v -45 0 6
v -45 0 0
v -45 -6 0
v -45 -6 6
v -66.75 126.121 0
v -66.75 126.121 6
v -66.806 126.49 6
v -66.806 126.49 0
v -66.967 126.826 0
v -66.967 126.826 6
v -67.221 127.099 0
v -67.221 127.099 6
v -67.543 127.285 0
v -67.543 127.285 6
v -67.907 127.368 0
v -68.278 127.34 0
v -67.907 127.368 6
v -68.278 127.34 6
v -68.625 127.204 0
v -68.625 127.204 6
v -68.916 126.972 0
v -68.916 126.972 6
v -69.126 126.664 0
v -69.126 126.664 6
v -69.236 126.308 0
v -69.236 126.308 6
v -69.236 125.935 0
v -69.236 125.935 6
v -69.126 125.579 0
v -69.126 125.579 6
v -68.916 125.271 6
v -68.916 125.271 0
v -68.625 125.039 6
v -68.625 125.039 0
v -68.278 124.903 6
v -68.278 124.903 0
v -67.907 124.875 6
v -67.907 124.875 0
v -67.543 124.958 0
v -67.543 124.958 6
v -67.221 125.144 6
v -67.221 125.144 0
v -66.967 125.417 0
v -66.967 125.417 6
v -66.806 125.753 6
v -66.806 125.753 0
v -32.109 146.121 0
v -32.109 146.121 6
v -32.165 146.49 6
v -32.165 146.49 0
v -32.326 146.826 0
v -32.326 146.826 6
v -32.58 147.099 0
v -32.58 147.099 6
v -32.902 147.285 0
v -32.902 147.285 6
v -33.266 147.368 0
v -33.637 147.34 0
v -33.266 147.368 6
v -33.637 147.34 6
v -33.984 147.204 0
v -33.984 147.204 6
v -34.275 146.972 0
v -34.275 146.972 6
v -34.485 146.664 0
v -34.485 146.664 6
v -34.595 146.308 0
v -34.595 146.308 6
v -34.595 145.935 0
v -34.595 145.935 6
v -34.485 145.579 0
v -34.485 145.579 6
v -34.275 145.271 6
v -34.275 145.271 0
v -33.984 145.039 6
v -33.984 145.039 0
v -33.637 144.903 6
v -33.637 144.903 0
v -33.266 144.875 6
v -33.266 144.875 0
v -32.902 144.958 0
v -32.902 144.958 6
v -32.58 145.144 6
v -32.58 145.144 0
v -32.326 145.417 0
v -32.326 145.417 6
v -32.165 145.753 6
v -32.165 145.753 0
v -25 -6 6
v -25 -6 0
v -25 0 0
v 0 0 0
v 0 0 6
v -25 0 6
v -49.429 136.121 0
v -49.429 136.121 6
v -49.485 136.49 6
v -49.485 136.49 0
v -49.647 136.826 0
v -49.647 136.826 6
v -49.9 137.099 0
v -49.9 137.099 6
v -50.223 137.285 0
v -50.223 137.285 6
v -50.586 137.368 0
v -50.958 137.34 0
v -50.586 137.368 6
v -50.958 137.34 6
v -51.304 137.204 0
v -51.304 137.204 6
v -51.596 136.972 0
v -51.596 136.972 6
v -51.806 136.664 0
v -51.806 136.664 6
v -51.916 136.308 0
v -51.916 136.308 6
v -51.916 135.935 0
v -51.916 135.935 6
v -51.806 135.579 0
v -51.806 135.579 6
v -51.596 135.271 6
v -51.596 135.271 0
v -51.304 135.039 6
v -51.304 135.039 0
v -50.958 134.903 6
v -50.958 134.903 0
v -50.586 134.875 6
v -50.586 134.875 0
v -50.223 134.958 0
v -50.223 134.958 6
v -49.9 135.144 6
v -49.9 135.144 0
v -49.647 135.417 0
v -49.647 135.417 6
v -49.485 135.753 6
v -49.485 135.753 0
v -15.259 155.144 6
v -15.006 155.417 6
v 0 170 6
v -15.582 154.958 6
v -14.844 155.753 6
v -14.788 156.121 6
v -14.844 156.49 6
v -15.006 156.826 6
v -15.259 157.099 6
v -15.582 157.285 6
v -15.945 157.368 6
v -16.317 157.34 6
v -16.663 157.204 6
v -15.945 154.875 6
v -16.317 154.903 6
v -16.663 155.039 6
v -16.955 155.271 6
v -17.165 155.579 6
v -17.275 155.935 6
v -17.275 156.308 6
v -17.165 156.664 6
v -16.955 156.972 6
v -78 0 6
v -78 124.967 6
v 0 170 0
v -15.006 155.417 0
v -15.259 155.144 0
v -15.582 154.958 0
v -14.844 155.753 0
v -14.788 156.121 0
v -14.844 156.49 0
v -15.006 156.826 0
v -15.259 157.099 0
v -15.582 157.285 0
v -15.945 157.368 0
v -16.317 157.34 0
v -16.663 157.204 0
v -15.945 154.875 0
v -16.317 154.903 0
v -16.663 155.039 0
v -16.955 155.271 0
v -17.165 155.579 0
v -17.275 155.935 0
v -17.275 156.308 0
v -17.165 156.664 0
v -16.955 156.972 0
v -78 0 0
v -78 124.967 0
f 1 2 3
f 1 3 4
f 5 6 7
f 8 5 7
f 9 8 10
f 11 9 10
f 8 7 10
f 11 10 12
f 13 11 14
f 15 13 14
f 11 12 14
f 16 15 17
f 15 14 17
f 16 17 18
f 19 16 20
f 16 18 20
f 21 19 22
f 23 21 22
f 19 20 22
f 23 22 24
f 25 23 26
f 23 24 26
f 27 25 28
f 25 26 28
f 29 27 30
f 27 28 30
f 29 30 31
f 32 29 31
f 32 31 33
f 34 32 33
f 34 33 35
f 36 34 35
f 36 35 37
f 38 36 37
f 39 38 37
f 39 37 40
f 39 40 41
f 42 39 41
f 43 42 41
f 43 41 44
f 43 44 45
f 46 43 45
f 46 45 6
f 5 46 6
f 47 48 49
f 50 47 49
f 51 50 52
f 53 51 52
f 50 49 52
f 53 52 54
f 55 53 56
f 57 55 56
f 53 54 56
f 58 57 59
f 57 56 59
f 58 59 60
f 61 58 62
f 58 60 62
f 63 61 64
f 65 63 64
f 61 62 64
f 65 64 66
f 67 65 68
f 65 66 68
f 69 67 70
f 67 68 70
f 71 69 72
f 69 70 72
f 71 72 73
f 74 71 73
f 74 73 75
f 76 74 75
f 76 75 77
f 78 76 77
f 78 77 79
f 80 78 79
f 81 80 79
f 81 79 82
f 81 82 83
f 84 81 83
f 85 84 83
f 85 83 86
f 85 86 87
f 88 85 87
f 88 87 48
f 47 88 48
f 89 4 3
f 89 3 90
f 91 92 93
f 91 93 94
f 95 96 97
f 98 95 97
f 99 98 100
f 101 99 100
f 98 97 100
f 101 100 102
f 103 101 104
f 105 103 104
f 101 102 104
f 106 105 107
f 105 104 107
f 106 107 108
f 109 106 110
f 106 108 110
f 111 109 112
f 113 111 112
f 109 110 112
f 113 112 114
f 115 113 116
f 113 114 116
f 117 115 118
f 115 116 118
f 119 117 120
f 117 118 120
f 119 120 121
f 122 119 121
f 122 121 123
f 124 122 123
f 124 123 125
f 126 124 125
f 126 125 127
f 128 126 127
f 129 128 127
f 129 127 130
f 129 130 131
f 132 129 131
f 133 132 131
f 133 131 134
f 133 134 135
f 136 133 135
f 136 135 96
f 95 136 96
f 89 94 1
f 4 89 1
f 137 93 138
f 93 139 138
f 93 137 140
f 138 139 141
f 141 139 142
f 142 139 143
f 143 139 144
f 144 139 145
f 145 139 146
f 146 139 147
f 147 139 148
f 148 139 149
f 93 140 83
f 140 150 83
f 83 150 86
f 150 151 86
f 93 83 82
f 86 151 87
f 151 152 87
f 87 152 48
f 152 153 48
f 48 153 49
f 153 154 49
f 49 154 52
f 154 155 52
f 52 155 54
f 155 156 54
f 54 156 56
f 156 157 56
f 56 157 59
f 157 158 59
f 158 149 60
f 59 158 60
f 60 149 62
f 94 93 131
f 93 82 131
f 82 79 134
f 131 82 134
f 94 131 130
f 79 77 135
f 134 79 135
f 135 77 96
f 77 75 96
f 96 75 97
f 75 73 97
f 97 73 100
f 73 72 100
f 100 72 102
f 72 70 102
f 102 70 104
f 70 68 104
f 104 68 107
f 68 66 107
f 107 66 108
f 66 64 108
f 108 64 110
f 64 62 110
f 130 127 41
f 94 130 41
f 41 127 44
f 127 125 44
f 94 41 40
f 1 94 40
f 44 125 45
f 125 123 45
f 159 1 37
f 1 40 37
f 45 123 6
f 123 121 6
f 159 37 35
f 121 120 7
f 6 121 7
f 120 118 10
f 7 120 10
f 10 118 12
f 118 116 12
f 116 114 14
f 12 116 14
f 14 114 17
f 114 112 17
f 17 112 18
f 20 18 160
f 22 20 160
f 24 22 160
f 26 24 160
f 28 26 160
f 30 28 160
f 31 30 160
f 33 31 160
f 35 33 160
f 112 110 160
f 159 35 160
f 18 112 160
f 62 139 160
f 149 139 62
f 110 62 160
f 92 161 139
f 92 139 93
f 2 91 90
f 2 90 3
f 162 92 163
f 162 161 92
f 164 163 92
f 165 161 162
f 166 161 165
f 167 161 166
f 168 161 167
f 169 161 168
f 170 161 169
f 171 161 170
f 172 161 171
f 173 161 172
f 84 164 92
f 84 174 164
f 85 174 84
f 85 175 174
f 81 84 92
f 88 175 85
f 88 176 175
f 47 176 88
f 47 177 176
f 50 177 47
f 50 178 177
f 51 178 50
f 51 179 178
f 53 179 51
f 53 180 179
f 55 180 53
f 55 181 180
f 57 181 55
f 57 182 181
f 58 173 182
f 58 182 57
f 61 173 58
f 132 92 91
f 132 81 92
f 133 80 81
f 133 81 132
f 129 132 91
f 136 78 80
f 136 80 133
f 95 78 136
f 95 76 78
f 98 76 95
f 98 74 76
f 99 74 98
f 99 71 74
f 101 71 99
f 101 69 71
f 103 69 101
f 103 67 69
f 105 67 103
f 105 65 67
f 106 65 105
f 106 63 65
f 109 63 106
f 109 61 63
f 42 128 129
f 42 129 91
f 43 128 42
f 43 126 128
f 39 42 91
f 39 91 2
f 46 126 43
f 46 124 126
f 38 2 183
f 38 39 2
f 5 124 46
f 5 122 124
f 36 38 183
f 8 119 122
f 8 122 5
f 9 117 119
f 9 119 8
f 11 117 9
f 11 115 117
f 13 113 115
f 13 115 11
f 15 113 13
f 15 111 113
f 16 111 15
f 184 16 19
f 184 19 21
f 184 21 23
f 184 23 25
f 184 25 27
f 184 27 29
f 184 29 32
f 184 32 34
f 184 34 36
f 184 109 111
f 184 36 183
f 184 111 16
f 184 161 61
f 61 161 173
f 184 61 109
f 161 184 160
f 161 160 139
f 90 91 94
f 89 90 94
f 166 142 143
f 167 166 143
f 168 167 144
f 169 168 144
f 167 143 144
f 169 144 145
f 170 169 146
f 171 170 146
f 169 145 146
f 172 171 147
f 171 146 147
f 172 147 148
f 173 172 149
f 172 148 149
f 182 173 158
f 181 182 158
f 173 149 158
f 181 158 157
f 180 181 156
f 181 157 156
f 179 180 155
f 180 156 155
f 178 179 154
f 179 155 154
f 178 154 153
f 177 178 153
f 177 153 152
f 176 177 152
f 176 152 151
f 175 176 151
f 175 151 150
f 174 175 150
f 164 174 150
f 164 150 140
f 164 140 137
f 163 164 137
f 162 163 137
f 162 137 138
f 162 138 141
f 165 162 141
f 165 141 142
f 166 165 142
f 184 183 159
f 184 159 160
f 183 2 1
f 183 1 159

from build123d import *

# Parameters (mm, degrees)
BOSS_EXTRU_1_DEPTH      = 6
ESQUISSE2_R             = 1.25
ENL_V_MAT_EXTRU_1_DEPTH = 10
ESQUISSE4_W             = 20
ESQUISSE4_H             = 6
BOSS_EXTRU_2_DEPTH      = 6


with BuildPart() as part:
    # Esquisse1 → Boss.-Extru.1 (new body)
    with BuildSketch(Plane.XY):
        Polygon((-78, 0), (-78, 124.966679003), (0, 170), (0, 0), align=None)
    extrude(amount=BOSS_EXTRU_1_DEPTH)

    # Esquisse2 → Enlèv. mat.-Extru.1 (cut)
    with BuildSketch(Plane.XY.offset(6)):
        with Locations((-68, 126.121379542)):
            Circle(ESQUISSE2_R)
        with Locations((-50.679491924, 136.121379542)):
            Circle(ESQUISSE2_R)
        with Locations((-16.038475773, 156.121379542)):
            Circle(ESQUISSE2_R)
        with Locations((-33.358983849, 146.121379542)):
            Circle(ESQUISSE2_R)
    extrude(amount=-ENL_V_MAT_EXTRU_1_DEPTH, mode=Mode.SUBTRACT)

    # Esquisse4 → Boss.-Extru.2 (add)
    with BuildSketch(Plane.XZ):
        with Locations((-35, 3)):
            Rectangle(ESQUISSE4_W, ESQUISSE4_H)
    extrude(amount=BOSS_EXTRU_2_DEPTH)


solid = part.part
